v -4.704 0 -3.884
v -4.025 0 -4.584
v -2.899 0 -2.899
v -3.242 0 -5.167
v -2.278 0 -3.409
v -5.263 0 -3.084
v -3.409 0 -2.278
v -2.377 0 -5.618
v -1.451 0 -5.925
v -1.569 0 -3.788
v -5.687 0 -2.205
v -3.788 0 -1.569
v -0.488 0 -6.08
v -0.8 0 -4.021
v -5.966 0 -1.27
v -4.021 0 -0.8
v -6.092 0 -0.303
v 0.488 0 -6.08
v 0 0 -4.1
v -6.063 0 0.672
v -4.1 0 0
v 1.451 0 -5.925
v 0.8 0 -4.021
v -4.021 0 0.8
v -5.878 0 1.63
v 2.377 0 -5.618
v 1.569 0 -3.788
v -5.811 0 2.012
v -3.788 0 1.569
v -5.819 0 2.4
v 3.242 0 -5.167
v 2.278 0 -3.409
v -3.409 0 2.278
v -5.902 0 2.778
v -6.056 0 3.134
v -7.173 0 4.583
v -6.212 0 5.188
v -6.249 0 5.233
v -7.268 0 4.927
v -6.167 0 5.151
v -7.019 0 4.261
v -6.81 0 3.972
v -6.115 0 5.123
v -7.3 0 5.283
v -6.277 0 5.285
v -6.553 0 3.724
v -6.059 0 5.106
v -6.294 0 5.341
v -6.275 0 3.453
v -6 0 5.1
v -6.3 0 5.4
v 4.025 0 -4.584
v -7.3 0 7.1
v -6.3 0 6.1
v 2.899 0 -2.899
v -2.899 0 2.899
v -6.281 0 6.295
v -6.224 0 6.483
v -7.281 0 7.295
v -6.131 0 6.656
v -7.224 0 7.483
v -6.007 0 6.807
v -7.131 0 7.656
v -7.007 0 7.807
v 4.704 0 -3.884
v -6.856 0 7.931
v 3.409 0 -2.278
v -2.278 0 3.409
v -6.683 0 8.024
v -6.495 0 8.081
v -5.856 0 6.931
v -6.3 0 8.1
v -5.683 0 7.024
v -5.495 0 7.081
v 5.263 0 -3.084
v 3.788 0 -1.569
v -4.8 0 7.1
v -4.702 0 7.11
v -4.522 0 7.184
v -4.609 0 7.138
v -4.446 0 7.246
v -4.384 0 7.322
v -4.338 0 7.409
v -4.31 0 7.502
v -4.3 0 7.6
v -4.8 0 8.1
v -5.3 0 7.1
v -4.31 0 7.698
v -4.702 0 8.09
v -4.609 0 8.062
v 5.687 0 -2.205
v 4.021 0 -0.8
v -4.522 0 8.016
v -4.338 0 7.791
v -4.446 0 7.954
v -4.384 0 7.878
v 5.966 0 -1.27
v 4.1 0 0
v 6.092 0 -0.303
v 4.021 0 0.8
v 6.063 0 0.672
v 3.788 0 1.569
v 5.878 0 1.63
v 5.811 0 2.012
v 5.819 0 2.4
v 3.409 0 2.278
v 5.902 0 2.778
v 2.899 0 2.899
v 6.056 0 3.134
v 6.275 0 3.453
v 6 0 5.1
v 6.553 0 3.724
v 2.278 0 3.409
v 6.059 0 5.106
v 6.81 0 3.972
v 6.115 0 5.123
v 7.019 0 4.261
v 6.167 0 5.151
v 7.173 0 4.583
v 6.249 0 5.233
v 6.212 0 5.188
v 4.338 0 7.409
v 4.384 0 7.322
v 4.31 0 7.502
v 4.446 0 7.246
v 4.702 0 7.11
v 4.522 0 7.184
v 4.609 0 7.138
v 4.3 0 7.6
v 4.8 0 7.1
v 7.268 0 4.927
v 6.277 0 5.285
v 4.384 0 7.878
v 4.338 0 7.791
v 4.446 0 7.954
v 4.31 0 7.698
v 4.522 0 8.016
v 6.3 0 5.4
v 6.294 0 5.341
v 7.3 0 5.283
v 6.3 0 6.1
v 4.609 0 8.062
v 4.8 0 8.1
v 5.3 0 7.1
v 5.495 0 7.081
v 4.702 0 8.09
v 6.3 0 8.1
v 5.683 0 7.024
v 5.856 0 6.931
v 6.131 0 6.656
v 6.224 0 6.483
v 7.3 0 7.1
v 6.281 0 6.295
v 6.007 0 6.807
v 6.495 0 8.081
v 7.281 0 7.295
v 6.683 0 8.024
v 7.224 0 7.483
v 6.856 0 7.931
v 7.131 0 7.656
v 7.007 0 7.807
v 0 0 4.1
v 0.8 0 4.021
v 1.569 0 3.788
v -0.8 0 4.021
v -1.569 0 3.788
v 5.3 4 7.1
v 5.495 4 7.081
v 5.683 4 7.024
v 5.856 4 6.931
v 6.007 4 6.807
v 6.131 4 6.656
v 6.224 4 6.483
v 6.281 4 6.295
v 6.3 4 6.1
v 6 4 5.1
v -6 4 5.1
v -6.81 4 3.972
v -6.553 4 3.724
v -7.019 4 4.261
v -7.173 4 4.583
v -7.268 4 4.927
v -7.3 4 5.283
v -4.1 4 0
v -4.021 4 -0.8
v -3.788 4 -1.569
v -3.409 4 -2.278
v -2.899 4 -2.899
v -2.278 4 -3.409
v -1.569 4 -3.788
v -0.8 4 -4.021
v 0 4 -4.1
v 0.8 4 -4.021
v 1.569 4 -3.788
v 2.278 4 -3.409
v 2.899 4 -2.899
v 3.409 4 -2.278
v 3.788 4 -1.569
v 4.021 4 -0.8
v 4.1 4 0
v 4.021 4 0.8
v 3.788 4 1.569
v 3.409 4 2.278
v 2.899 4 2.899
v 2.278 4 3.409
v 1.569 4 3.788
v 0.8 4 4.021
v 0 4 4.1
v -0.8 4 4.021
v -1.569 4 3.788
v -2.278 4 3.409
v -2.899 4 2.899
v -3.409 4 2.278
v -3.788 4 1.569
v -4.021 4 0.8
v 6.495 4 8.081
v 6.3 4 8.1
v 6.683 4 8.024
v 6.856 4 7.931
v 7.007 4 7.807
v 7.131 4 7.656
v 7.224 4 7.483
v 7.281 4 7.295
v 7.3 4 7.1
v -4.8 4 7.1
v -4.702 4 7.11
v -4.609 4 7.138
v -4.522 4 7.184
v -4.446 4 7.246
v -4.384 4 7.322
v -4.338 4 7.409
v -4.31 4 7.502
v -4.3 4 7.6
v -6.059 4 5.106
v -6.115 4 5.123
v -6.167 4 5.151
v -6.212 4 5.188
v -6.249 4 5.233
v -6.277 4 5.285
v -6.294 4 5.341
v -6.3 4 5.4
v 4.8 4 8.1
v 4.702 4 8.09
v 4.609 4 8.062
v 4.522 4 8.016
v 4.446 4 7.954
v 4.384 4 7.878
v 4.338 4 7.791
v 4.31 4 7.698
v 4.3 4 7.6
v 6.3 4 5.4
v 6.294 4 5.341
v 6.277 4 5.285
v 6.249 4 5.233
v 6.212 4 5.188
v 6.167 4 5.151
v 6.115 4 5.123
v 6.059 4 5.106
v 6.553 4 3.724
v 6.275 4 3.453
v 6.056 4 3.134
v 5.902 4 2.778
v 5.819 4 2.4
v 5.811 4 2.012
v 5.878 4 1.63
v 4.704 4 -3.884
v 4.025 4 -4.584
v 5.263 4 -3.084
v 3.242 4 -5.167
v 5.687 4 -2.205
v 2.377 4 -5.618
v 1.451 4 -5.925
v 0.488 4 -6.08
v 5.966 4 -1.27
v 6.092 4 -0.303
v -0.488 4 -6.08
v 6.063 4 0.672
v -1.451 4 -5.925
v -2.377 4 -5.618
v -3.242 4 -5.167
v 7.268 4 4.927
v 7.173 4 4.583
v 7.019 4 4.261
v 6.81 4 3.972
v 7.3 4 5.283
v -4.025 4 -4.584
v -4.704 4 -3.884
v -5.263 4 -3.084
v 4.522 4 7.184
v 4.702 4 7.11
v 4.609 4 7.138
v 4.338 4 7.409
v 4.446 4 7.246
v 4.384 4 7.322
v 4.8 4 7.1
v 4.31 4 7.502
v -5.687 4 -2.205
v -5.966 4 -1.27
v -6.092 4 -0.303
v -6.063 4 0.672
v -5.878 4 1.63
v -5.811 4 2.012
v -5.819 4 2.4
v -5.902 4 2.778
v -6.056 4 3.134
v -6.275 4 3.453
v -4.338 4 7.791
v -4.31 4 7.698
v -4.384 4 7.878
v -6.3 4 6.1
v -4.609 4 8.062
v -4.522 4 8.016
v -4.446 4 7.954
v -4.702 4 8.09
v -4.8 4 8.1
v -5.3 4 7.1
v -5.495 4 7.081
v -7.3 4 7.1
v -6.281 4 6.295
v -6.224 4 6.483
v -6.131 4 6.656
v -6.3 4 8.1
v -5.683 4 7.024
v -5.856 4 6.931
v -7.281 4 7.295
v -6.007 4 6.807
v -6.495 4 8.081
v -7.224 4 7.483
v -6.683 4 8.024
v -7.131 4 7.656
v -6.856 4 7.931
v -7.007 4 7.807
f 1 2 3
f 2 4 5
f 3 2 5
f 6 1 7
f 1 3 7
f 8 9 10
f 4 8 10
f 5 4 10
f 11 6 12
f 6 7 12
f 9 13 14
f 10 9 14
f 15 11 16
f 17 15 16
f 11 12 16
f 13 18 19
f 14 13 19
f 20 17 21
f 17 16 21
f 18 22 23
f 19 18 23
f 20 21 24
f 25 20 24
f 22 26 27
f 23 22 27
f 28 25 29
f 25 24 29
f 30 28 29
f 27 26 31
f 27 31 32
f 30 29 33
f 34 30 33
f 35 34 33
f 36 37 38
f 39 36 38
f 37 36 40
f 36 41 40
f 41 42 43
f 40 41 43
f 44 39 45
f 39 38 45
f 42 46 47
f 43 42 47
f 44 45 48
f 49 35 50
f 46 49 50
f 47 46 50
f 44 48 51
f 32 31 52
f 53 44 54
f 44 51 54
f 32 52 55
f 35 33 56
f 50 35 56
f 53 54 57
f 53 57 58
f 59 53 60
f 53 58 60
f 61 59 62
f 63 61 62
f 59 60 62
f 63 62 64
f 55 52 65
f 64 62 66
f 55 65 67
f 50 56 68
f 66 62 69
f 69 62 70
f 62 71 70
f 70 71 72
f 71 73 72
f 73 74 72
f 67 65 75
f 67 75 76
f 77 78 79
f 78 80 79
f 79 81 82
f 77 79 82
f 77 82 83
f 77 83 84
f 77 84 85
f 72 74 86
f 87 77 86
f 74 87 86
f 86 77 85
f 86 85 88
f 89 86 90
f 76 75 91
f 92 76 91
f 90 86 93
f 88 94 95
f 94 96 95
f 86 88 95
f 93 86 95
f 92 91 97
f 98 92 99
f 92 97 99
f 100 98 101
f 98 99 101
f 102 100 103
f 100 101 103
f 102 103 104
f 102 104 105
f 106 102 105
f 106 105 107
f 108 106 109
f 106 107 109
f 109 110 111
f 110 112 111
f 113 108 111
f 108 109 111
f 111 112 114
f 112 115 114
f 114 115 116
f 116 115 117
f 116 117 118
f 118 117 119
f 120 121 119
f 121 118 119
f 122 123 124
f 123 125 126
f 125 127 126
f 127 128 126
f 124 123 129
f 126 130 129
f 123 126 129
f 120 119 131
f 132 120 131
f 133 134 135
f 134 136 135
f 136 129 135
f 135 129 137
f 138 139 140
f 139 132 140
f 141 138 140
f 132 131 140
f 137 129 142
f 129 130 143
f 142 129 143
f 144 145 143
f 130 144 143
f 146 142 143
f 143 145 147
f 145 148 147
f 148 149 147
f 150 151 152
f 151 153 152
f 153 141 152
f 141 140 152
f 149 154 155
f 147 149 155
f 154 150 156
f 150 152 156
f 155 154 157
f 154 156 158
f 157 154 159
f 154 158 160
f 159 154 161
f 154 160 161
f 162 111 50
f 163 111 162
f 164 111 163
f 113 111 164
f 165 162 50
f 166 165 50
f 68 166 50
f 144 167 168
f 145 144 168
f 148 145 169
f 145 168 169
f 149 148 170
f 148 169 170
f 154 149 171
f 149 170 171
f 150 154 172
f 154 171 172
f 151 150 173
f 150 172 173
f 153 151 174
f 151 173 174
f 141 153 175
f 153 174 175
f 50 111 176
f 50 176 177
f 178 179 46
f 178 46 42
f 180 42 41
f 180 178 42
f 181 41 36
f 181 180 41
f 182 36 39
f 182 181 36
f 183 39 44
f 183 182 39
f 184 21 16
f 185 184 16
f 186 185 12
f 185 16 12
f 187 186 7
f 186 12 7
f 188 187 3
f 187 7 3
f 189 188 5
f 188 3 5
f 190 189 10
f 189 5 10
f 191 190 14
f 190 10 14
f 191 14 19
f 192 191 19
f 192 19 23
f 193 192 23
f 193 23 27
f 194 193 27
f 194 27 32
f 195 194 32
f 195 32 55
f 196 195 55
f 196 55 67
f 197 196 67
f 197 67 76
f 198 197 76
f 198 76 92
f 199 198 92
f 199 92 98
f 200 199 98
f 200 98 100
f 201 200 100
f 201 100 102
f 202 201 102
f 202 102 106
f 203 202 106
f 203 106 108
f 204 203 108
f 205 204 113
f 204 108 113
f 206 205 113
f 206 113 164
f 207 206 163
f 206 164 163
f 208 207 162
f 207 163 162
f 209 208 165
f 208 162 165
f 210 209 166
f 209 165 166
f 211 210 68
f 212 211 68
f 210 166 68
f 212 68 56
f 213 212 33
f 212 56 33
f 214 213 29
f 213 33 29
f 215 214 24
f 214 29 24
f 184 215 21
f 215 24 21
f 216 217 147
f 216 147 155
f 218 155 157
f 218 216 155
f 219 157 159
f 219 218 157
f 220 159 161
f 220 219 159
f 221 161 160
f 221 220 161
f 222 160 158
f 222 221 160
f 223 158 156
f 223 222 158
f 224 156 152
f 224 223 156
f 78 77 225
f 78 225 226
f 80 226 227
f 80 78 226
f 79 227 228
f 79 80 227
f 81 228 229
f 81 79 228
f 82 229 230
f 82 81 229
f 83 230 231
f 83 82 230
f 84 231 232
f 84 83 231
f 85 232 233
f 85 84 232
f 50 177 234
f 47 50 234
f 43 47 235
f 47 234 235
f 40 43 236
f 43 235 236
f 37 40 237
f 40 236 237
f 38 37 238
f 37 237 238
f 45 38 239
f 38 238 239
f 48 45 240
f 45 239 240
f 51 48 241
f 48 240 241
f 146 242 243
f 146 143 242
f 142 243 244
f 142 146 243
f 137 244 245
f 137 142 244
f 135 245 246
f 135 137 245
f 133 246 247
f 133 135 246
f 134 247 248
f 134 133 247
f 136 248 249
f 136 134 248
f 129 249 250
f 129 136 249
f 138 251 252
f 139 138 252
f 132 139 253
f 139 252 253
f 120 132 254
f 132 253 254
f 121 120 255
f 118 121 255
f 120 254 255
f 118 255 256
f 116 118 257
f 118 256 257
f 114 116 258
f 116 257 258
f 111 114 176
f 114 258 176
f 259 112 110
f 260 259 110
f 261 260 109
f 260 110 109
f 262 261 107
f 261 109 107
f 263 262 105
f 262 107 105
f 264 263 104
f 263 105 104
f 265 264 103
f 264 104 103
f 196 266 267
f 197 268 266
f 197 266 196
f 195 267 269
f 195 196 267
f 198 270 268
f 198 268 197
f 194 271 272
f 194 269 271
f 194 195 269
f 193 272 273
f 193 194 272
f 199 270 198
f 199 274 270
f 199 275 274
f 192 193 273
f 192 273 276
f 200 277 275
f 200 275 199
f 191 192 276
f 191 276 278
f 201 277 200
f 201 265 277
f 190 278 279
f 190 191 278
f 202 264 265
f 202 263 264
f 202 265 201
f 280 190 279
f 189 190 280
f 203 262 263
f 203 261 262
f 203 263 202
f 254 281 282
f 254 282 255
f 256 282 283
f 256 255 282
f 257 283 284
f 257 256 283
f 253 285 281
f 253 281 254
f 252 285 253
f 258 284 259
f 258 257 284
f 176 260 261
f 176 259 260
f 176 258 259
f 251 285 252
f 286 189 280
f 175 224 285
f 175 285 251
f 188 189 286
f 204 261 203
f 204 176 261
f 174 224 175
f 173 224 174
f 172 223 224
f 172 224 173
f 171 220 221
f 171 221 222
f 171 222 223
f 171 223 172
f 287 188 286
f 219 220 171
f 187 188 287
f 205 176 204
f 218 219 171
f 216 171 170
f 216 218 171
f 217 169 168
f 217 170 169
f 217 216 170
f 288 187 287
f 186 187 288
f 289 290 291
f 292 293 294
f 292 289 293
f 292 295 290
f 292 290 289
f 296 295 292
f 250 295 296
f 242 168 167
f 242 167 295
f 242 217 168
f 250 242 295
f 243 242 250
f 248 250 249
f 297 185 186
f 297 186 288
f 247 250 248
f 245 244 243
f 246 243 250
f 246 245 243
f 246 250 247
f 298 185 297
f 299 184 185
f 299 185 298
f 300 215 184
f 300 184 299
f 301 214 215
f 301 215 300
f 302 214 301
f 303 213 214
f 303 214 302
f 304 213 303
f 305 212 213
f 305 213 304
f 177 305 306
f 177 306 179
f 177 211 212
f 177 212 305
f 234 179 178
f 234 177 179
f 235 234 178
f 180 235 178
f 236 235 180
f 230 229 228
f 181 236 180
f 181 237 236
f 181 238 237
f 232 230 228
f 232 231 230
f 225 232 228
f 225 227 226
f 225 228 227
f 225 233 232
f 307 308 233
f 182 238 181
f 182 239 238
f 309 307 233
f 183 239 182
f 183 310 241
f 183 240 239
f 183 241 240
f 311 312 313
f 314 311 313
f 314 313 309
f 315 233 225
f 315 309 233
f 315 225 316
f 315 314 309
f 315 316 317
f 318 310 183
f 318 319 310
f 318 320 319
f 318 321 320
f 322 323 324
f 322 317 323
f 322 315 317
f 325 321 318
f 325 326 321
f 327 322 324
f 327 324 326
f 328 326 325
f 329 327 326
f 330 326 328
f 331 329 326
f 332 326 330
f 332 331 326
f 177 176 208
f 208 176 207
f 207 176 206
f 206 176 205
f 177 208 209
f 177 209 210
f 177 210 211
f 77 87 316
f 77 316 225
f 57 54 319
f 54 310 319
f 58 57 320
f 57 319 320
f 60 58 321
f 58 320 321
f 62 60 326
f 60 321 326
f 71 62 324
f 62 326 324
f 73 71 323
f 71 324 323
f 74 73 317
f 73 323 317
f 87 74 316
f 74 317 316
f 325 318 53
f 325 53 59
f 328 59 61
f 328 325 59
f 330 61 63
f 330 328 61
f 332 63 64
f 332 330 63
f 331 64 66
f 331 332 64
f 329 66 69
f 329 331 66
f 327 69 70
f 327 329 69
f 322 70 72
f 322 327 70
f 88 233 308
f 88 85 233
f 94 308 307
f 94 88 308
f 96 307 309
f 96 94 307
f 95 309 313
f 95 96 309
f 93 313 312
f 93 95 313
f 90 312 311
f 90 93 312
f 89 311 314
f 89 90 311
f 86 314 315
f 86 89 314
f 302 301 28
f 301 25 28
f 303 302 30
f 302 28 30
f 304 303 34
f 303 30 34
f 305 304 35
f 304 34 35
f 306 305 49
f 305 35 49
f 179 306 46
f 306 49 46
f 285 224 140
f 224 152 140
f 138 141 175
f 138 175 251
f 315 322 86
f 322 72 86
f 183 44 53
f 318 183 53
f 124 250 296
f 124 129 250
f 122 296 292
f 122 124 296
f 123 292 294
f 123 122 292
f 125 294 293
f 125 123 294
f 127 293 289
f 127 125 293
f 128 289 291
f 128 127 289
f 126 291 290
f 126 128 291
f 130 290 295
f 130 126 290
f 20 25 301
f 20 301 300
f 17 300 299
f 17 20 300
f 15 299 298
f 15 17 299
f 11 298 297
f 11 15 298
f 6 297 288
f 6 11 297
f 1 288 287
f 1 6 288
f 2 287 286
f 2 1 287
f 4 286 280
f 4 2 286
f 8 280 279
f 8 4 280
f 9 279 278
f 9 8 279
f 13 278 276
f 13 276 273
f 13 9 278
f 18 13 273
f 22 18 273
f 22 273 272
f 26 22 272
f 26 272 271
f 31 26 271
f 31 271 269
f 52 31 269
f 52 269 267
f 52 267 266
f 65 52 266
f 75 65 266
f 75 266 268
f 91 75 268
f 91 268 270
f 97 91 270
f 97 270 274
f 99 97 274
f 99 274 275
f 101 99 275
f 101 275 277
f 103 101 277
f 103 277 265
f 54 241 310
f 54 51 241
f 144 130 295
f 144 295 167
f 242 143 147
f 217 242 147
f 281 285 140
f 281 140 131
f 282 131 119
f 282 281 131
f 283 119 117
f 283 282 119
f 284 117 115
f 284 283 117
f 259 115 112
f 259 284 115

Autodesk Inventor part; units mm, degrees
ref_plane "YZ Plane" through (0, 0, 0) normal (1, 0, 0) x (0, 1, 0)
ref_plane "XZ Plane" through (0, 0, 0) normal (0, 1, 0) x (-1, 0, 0)
ref_plane "XY Plane" through (0, 0, 0) normal (0, 0, 1) x (1, 0, 0)
sketch "Sketch1" plane through (0, 0, 0) normal (0, 1, 0) x (-1, 0, 0)
  circle A0 centre (0, 0) radius 4.1
  line L0 (6.3, 7.1) -> (-6.3, 7.1)
  line L1 (-6.3, 7.1) -> (-6.3, 5.1)
  line L2 (-6.3, 5.1) -> (6.3, 5.1)
  line L3 (6.3, 5.1) -> (6.3, 7.1)
  line L4 (6.3, 7.1) -> (-6.3, 5.1) construction
  line L5 (-6.3, 7.1) -> (6.3, 5.1) construction
  circle A1 centre (0, 0) radius 6.1
  line L6 (7.3, 8.1) -> (-7.3, 8.1)
  line L7 (-7.3, 8.1) -> (-7.3, 4.1)
  line L8 (-7.3, 4.1) -> (7.3, 4.1)
  line L9 (7.3, 4.1) -> (7.3, 8.1)
  point P0 (0, 6.1)
  point P1 (0, 6.1)
  point P2 (-4.5166, 4.1)
  point P3 (4.5166, 4.1)
  dimension "d0" = 8.2
  dimension "d1" = 12.6
  dimension "d2" = 2
  dimension "d3" = 1
  dimension "d4" = 1
  dimension "d5" = 2
extrude "Extrusion1" add sketch "Sketch1" along normal blind 4 contours L8 A1 | L8 A1 L2 | L8 L7 L6 L9 A1 L2 L3 L0 L1
fillet "Fillet1" radius 2 2 edges at (-4.5166, 2, 4.1) (4.5166, 2, 4.1)
fillet "Fillet2" radius 2 2 edges at (-7.3, 2, 4.1) (7.3, 2, 4.1)
fillet "Fillet3" radius 1 2 edges at (-7.3, 2, 8.1) (7.3, 2, 8.1)
sketch "Sketch2" plane through (0, 4, 0) normal (0, 1, 0) x (1, 0, 0)
  line L0 (6.3, -7.1) -> (-6.3, -7.1) projected
  line L1 (-6.3, -8.1) -> (6.3, -8.1) projected
  line L2 (-4.3, -7.1) -> (4.3, -7.1)
  line L3 (4.3, -7.1) -> (4.3, -8.1)
  line L4 (4.3, -8.1) -> (-4.3, -8.1)
  line L5 (-4.3, -8.1) -> (-4.3, -7.1)
  line L6 (-6.3, -7.1) -> (-6.3, -5.1) projected
  line L7 (6.3, -5.1) -> (6.3, -7.1) projected
  point P0 (0, 0)
  point P1 (4.3, -7.1)
  dimension "d11" = 2
  dimension "d12" = 2
extrude "Extrusion2" cut sketch "Sketch2" against normal through all
fillet "Fillet4" radius 0.5 4 edges at (-4.3, 2, 7.1) (-4.3, 2, 8.1) (4.3, 2, 7.1) (4.3, 2, 8.1)
fillet "Fillet5" radius 1 2 edges at (-6.3, 2, 7.1) (6.3, 2, 7.1)
fillet "Fillet6" radius 0.3 2 edges at (-6.3, 2, 5.1) (6.3, 2, 5.1)
properties part number "clip_rod" material "ABS Plastic"
